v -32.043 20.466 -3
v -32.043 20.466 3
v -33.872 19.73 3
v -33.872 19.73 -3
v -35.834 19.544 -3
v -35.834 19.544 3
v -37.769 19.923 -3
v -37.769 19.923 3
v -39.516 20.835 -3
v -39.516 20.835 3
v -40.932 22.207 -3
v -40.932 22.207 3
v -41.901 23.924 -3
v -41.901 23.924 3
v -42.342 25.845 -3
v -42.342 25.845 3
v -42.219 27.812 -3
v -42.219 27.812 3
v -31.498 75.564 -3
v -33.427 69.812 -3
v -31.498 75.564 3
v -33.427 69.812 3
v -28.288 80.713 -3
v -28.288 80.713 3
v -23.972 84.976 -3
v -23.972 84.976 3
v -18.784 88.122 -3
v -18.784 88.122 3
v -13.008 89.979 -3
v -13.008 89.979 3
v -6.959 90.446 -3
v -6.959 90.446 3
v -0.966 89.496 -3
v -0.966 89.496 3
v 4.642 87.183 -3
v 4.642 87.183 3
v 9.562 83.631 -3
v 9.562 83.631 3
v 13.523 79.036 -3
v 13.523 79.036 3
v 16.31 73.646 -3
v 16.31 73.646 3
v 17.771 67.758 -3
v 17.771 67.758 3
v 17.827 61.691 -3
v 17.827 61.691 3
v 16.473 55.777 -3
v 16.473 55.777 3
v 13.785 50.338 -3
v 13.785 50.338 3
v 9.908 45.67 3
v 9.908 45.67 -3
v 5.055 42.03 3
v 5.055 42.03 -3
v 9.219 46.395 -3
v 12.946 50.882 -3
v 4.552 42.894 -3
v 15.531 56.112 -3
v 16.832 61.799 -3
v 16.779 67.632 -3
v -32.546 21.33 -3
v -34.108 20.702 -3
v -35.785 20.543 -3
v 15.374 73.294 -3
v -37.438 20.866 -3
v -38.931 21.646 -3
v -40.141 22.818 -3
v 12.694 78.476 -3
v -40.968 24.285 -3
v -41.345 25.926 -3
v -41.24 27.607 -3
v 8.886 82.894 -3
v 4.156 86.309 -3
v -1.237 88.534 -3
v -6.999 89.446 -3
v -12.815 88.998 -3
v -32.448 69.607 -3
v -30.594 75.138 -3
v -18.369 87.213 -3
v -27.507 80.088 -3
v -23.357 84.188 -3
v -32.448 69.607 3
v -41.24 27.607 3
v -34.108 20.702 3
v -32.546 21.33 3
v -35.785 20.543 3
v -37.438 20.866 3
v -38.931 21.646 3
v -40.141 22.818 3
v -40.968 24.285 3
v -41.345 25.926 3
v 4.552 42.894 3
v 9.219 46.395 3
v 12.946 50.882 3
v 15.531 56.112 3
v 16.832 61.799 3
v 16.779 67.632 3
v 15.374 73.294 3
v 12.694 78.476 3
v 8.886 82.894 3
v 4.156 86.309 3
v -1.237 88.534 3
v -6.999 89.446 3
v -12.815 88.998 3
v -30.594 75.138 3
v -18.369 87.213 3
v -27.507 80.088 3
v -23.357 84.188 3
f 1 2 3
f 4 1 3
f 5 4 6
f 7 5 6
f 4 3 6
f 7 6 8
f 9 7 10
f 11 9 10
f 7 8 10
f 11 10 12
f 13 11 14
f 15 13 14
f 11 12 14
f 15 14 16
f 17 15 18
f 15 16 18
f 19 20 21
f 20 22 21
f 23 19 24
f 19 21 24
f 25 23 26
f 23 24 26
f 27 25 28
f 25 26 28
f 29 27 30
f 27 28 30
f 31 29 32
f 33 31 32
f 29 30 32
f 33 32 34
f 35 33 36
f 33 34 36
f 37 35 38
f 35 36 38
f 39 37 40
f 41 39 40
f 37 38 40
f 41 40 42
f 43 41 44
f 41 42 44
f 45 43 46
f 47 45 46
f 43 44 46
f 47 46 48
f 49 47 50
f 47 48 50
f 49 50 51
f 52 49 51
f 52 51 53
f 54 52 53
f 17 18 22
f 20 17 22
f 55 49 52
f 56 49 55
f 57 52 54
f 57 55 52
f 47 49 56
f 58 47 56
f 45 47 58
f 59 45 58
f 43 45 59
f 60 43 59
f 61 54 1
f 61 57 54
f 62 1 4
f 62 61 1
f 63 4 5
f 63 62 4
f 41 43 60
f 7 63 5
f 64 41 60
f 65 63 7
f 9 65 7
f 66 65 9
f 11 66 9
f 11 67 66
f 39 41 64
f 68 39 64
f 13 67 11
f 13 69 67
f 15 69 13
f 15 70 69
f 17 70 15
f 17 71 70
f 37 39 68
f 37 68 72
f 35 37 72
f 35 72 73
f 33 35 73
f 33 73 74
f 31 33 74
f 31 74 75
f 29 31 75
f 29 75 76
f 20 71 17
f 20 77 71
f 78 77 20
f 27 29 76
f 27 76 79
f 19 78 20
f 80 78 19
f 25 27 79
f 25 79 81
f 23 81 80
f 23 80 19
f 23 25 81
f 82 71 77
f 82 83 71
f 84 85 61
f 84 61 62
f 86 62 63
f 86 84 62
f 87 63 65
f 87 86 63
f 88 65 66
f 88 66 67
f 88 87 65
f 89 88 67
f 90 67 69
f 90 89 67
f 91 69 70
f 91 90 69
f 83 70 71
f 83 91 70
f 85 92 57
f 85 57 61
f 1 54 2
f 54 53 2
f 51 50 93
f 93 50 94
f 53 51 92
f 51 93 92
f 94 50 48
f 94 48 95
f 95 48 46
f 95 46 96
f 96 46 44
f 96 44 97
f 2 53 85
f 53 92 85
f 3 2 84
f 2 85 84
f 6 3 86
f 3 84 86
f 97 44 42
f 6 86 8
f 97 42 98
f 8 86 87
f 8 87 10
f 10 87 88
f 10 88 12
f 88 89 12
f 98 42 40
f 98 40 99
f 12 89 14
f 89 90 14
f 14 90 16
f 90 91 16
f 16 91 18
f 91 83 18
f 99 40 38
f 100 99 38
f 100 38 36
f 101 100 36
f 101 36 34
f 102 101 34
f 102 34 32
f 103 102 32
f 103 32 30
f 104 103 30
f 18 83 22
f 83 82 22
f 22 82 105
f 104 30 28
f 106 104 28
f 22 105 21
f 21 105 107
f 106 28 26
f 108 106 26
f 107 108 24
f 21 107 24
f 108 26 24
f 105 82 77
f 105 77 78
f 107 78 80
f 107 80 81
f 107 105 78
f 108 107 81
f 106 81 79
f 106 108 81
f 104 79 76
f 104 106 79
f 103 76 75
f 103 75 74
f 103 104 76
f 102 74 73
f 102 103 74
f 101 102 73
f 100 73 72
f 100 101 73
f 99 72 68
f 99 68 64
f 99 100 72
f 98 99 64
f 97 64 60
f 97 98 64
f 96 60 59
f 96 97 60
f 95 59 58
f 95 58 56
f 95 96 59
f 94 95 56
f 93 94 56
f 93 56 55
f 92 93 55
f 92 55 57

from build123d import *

# Parameters (mm, degrees)
EXTRUDE_THIN1_DEPTH      = 3
EXTRUDE_THIN1_DEPTH_BACK = 3


with BuildPart() as part:
    # Sketch2 → Extrude-Thin1 (new, two sides)
    with BuildSketch(Plane.XY) as extrude_thin1_sk:
        with BuildLine():
            Line((-42.218873031, 27.812367004), (-33.426518735, 69.811728506))
            ThreePointArc((-33.426518735, 69.811728506), (7.206095545, 85.551006884), (5.054820151, 42.029676007))
            Line((5.054820151, 42.029676007), (-32.043042704, 20.465807333))
            ThreePointArc((-32.043042704, 20.465807333), (-39.516230782, 20.835209769), (-42.218873031, 27.812367004))
        make_face()
        with BuildLine():
            Line((-41.240090772, 27.60746388), (-32.447736476, 69.606825381))
            ThreePointArc((-32.447736476, 69.606825381), (6.620743822, 84.740227406), (4.552280795, 42.894230341))
            Line((4.552280795, 42.894230341), (-32.54558206, 21.330361667))
            ThreePointArc((-32.54558206, 21.330361667), (-38.93087906, 21.645989246), (-41.240090772, 27.60746388))
        make_face(mode=Mode.SUBTRACT)
    extrude(amount=EXTRUDE_THIN1_DEPTH)
    extrude(extrude_thin1_sk.sketch, amount=-EXTRUDE_THIN1_DEPTH_BACK)


solid = part.part
